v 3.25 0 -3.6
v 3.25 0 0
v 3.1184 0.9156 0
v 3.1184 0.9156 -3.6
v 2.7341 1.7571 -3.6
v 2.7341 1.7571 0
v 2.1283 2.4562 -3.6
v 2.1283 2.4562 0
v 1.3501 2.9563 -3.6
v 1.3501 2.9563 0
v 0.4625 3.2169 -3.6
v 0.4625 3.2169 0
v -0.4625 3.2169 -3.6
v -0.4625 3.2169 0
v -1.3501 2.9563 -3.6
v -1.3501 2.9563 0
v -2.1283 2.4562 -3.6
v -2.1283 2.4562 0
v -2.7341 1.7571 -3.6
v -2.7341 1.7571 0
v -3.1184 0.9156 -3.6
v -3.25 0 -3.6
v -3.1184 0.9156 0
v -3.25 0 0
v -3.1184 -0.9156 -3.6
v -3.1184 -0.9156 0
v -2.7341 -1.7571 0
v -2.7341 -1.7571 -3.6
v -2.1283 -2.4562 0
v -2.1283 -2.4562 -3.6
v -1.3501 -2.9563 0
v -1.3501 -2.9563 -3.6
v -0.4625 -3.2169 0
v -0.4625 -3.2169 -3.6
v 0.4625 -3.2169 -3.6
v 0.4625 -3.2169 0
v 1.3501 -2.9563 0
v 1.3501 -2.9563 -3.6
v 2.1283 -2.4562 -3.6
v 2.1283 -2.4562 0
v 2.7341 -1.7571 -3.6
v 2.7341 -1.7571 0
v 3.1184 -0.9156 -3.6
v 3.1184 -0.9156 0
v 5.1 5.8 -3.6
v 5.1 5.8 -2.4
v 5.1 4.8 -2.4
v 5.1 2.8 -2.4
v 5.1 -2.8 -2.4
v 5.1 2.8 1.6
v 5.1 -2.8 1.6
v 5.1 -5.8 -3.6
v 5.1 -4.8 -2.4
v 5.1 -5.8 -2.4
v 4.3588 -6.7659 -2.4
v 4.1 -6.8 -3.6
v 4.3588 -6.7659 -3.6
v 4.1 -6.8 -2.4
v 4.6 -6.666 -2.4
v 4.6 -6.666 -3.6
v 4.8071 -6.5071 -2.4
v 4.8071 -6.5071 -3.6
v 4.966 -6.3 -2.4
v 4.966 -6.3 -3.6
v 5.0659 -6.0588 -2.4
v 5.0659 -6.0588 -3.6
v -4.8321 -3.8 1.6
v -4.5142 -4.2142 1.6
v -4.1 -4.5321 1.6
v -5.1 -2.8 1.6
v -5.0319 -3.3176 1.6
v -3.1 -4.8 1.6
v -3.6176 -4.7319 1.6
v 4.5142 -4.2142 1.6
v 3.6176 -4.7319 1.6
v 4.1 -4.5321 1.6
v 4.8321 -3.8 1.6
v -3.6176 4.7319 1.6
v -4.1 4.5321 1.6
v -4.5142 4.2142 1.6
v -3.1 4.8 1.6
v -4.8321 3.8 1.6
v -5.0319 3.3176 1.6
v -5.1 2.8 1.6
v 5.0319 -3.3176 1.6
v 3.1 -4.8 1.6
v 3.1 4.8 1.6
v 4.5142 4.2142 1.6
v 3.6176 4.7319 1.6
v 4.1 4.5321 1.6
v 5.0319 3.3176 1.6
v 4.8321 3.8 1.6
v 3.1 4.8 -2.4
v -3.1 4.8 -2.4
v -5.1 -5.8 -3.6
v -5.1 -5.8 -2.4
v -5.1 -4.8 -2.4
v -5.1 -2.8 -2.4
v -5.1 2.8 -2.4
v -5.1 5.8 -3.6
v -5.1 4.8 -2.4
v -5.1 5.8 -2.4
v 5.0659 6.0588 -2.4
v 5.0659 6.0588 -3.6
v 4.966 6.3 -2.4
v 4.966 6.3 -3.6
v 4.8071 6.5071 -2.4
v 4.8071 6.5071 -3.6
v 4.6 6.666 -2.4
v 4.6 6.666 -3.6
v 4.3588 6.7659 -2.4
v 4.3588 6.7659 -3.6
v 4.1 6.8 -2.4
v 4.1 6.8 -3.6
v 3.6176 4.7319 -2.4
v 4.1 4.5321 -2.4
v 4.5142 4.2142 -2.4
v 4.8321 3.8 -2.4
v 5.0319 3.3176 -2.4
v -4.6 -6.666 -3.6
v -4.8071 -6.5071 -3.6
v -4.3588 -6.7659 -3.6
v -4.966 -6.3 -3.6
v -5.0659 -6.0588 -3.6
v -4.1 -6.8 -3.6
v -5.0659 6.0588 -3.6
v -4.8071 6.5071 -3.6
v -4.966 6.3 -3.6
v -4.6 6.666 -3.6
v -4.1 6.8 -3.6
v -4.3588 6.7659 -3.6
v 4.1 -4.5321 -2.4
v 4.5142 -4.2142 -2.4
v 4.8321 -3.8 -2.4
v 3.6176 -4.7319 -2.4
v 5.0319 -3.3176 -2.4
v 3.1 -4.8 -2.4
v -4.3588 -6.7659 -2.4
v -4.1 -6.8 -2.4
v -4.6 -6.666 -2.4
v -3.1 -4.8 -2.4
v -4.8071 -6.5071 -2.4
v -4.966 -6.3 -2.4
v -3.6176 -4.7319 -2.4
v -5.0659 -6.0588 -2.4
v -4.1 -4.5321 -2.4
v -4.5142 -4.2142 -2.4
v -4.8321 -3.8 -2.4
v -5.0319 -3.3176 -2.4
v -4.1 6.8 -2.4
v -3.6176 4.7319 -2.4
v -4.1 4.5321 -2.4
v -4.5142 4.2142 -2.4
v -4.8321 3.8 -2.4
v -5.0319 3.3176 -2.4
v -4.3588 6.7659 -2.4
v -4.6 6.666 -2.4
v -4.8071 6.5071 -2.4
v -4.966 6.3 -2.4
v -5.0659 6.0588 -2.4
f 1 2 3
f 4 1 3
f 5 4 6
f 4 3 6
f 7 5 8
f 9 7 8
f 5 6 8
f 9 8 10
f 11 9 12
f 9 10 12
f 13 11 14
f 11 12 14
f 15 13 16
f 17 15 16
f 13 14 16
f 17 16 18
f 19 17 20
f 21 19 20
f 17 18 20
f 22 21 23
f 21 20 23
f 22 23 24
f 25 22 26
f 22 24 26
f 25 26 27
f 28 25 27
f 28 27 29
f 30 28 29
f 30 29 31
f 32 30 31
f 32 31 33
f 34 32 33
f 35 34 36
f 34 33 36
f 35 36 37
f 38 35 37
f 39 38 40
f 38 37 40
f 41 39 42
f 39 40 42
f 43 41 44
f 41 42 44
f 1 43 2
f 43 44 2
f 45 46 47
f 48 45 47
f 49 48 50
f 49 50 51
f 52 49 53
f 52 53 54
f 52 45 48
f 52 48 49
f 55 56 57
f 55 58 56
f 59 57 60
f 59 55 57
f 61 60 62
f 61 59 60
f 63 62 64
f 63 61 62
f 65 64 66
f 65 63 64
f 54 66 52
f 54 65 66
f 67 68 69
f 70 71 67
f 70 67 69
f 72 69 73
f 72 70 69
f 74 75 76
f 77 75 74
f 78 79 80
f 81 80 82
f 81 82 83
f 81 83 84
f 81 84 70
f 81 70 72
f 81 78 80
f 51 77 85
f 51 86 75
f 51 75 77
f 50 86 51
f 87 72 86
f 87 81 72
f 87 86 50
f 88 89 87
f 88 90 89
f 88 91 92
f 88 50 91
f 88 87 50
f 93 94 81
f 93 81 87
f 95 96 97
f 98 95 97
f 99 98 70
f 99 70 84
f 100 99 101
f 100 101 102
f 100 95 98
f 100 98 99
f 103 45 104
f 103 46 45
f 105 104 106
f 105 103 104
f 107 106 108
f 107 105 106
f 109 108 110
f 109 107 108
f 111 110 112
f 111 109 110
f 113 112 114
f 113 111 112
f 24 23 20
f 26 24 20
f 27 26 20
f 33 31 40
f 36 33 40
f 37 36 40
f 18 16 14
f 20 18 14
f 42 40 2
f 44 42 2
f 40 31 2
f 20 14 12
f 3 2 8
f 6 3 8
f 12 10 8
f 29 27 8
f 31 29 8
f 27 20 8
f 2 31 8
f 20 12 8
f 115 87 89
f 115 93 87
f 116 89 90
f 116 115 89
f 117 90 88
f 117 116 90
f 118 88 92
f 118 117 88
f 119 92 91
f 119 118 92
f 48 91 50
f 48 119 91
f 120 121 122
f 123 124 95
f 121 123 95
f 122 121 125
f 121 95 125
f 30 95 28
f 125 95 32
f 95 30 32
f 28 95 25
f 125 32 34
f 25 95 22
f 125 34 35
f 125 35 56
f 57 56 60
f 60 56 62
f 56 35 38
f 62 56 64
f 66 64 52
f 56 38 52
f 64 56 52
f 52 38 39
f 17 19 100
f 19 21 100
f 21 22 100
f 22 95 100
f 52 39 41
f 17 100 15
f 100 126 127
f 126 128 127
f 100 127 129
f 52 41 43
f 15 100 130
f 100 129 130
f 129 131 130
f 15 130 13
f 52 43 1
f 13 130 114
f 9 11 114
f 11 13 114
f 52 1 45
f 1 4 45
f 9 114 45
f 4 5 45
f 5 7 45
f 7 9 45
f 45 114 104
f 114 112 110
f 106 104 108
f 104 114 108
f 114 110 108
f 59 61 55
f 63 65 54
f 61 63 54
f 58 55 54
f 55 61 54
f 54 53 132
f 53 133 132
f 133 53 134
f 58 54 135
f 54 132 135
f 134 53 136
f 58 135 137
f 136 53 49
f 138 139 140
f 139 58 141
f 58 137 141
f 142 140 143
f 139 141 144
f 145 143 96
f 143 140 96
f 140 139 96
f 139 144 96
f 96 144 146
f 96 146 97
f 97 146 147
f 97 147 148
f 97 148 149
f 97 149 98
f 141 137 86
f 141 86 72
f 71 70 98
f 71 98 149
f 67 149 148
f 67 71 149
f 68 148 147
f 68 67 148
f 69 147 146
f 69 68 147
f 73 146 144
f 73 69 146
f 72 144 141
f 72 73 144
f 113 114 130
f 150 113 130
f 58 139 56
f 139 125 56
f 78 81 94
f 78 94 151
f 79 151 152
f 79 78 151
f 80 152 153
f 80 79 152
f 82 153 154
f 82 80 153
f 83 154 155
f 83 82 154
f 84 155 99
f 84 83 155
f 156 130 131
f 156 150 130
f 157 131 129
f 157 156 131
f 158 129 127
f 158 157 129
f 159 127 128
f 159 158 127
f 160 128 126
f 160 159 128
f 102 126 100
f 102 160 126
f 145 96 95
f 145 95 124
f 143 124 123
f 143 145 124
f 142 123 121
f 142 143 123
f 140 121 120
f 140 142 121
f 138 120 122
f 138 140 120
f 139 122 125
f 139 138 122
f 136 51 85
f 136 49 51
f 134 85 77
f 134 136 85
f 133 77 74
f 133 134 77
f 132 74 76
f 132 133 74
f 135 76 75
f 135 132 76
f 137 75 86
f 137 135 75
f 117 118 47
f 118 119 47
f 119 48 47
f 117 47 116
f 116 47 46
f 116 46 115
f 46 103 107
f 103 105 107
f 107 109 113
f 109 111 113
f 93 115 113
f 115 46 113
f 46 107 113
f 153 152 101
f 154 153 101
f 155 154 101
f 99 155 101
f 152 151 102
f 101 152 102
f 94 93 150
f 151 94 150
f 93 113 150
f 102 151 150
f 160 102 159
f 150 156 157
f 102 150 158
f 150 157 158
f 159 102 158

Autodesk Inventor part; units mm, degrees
sketch "スケッチ1" plane through (0, 0, 0) normal (0, 0, 1) x (1, 0, 0)
  line L0 (-5.1, 4.8) -> (5.1, 4.8)
  line L1 (5.1, 4.8) -> (5.1, -4.8)
  line L2 (5.1, -4.8) -> (-5.1, -4.8)
  line L3 (-5.1, -4.8) -> (-5.1, 4.8)
  point P0 (0, 0)
  dimension "d0" = 4.8
  dimension "d1" = 4.8
  dimension "d2" = 5.1
  dimension "d3" = 5.1
extrude "押し出し1" add sketch "スケッチ1" along normal blind 1.6 and the other way blind 3.6
sketch "スケッチ2" plane through (0, 0, -3.6) normal (0, 0, -1) x (-1, 0, 0)
  line L0 (5.1, 4.8) -> (-5.1, 4.8) projected
  line L1 (-5.1, 4.8) -> (-5.1, -4.8) projected
  line L2 (-5.1, -4.8) -> (5.1, -4.8) projected
  line L3 (5.1, -4.8) -> (5.1, 4.8) projected
  line L4 (5.1, -6.8) -> (-5.1, -6.8)
  line L5 (-5.1, -6.8) -> (-5.1, 6.8)
  line L6 (-5.1, 6.8) -> (5.1, 6.8)
  line L7 (5.1, 6.8) -> (5.1, -6.8)
  line L8 (0, -9.52) -> (0, 9.52) projected
  point P0 (0, 0)
  dimension "d8" = 2
  dimension "d24" = 5.1
  dimension "d30" = 5.1
extrude "押し出し2" add sketch "スケッチ2" against normal blind 1.2 contours L0 L8 L6 L7 | L0 L5 L6 L8 | L7 L4 L8 L2 | L8 L4 L5 L2
sketch "スケッチ3" plane through (0, 0, 0) normal (0, 0, 1) x (1, 0, 0)
  line L0 (5.1, 4.8) -> (-5.1, 4.8) projected
  line L1 (-5.1, 4.8) -> (-5.1, -4.8) projected
  line L2 (-5.1, -4.8) -> (5.1, -4.8) projected
  line L3 (5.1, -4.8) -> (5.1, 4.8) projected
  circle A0 centre (0, 0) radius 3.25
  dimension "d28" = 6.5
extrude "押し出し3" cut sketch "スケッチ3" against normal through all contours A0
fillet "フィレット2" radius 2 4 edges at (5.1, -4.8, -0.4) (5.1, 4.8, -0.4) (-5.1, 4.8, -0.4) (-5.1, -4.8, -0.4)
fillet "フィレット3" radius 1 4 edges at (5.1, -6.8, -3) (-5.1, -6.8, -3) (5.1, 6.8, -3) (-5.1, 6.8, -3)
properties part number "HbBatteryLockKnob01"
